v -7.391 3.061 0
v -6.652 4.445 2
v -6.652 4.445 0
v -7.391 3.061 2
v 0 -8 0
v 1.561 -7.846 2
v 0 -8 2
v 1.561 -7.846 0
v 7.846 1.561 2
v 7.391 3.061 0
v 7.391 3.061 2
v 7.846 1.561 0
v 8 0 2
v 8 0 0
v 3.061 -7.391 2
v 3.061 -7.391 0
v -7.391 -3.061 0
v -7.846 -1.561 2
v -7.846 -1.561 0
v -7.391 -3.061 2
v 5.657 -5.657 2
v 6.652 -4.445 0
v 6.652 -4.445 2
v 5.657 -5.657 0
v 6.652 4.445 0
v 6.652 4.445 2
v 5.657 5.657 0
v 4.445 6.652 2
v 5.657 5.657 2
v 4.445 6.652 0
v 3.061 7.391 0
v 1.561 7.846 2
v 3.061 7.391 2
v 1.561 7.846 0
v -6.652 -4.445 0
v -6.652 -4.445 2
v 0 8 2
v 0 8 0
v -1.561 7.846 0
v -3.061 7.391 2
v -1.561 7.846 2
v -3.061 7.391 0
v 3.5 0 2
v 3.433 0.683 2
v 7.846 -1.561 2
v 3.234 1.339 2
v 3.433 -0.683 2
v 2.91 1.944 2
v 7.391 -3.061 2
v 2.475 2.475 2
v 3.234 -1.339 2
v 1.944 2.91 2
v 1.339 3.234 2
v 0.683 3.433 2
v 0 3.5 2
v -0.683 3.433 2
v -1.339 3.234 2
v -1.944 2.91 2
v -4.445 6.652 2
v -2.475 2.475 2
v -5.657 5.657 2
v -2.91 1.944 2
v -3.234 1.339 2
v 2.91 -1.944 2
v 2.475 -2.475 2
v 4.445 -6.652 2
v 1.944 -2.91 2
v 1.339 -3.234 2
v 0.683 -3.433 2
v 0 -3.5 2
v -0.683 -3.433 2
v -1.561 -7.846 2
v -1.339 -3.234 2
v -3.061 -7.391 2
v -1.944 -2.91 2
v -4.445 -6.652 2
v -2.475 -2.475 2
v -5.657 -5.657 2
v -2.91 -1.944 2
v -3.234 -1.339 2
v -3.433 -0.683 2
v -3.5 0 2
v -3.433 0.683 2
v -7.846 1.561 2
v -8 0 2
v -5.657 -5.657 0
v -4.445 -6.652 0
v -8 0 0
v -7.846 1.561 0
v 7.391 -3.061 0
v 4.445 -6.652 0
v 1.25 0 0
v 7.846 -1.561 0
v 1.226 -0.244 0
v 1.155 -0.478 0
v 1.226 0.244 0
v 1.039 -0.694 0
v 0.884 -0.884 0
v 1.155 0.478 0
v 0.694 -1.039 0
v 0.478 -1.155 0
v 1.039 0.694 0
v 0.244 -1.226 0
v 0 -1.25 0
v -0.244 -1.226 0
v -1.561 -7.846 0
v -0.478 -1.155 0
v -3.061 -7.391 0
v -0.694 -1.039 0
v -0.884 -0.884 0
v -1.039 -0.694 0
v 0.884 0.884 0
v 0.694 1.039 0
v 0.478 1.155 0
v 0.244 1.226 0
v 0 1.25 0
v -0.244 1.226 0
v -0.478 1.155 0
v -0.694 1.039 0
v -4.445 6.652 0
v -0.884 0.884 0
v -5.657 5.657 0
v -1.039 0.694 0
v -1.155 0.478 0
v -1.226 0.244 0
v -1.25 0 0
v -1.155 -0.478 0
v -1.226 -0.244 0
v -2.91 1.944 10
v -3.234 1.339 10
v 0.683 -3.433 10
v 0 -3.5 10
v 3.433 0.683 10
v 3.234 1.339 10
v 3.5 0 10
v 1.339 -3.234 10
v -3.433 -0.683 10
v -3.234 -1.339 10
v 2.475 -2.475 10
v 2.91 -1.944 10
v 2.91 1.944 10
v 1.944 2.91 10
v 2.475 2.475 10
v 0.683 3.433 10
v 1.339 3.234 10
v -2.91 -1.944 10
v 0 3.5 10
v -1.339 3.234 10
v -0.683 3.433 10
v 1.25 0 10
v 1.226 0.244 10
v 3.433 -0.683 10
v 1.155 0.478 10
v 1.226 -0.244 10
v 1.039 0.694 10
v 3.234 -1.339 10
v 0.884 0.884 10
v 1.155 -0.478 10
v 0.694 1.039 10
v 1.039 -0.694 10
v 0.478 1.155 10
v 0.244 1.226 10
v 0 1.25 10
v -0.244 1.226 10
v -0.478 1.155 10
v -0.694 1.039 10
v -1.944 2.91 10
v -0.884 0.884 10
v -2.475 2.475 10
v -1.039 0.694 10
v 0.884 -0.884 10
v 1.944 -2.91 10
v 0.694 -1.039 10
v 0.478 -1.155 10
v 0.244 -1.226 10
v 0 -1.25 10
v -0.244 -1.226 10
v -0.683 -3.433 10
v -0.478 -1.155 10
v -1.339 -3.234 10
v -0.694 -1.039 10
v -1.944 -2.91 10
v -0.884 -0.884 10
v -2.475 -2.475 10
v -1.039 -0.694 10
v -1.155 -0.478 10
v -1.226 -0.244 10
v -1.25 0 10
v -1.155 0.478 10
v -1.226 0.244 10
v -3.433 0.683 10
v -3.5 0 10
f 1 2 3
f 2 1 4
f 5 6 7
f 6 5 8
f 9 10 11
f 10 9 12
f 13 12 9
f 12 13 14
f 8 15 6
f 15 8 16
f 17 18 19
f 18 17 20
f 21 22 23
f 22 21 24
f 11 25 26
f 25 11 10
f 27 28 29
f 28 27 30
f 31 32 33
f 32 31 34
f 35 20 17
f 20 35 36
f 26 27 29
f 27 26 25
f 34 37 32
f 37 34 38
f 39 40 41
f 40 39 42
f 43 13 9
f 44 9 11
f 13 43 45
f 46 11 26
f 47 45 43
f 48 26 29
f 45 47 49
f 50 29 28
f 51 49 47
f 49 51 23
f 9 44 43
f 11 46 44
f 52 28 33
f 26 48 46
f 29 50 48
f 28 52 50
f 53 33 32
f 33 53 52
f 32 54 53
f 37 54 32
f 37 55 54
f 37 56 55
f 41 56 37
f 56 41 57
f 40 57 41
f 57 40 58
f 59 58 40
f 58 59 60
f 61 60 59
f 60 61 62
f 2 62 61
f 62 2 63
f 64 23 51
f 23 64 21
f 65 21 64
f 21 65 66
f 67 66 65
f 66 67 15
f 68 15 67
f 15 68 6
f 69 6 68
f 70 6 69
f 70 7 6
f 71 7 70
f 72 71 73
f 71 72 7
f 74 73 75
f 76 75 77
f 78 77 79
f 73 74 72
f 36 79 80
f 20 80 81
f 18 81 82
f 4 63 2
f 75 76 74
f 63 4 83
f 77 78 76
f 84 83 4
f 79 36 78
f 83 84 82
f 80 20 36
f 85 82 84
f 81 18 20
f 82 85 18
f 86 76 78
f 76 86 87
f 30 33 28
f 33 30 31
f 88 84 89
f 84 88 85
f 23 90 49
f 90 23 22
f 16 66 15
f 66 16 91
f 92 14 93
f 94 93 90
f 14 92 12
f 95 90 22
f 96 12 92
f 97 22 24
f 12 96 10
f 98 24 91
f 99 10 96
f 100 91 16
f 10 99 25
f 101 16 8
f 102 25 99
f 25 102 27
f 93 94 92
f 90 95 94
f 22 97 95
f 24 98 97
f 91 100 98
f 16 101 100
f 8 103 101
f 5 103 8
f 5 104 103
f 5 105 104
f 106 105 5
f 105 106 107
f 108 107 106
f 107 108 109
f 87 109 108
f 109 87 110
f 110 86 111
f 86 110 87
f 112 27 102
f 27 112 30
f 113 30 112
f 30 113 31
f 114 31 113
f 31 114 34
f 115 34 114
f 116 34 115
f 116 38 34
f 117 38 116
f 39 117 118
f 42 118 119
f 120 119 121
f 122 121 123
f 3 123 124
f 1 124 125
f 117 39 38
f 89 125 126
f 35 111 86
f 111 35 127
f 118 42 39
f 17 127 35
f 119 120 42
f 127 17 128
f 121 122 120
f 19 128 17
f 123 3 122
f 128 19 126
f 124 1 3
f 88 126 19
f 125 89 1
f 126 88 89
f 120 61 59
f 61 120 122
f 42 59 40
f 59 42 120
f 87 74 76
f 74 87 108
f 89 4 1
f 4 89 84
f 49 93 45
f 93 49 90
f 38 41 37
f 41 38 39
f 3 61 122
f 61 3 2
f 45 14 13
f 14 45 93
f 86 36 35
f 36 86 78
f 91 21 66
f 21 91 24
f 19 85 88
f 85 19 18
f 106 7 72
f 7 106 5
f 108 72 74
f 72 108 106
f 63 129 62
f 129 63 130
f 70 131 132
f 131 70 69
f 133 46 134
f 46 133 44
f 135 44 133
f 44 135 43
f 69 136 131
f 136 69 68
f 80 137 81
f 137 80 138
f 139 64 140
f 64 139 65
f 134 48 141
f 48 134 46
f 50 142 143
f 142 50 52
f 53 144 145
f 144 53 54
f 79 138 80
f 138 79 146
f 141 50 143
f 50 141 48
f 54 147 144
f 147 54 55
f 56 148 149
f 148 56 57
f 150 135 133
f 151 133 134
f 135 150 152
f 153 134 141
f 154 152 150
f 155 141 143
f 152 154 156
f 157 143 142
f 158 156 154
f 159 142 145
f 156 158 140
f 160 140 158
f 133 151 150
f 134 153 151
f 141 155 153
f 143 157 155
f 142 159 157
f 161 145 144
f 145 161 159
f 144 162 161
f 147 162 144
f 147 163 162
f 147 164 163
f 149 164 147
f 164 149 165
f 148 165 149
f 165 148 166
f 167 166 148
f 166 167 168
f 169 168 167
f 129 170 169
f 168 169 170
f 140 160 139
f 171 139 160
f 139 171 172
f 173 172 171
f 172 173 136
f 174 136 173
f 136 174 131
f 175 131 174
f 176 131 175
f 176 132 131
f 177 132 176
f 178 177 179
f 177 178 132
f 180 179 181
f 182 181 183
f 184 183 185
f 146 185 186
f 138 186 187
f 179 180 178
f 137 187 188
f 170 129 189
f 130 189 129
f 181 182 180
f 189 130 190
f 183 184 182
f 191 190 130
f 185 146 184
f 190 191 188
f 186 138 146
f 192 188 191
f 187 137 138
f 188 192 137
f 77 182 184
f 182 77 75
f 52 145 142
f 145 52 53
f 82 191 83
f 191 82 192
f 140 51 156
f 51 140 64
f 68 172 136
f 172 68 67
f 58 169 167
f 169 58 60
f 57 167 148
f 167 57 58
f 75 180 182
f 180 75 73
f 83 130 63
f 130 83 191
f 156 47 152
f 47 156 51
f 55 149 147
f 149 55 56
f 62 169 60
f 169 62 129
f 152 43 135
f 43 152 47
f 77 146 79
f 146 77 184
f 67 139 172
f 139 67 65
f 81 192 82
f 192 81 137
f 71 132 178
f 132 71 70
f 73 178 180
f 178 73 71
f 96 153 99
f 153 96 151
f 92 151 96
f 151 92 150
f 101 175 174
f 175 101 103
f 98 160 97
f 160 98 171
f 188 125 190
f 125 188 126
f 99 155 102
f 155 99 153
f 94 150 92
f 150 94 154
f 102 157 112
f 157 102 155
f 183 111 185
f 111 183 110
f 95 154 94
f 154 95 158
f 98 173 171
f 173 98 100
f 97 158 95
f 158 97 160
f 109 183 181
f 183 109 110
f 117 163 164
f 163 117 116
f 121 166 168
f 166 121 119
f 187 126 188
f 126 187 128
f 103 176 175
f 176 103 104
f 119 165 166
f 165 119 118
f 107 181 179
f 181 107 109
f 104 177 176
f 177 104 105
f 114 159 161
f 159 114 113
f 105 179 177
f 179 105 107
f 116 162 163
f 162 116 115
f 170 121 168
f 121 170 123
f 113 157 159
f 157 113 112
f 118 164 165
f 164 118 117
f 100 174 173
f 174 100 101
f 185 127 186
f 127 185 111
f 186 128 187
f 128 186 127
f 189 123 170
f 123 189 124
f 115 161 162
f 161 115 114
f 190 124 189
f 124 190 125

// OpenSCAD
$fn = 32;

// ----------------------------------------------------------------------
// Micro post: flanged post, 5-20 mm class
// ----------------------------------------------------------------------

// --- parameters (mm) ---
post_d = 7;               // post diameter
post_h = 8;               // post height above the flange
flange_d = 16;            // flange diameter
flange_t = 2;             // flange thickness
bore_d = 2.5;             // through bore
fit_tol = 0.05;           // tolerance for press fits, mm
free_tol = 0.2;           // tolerance for clearance fits, mm

total_h = post_h + flange_t;  // overall height

difference() {
  union() {
    cylinder(h = flange_t, d = flange_d);
    translate([0, 0, flange_t]) cylinder(h = post_h, d = post_d);
  }
  translate([0, 0, -1]) cylinder(h = total_h + 2, d = bore_d);
}
